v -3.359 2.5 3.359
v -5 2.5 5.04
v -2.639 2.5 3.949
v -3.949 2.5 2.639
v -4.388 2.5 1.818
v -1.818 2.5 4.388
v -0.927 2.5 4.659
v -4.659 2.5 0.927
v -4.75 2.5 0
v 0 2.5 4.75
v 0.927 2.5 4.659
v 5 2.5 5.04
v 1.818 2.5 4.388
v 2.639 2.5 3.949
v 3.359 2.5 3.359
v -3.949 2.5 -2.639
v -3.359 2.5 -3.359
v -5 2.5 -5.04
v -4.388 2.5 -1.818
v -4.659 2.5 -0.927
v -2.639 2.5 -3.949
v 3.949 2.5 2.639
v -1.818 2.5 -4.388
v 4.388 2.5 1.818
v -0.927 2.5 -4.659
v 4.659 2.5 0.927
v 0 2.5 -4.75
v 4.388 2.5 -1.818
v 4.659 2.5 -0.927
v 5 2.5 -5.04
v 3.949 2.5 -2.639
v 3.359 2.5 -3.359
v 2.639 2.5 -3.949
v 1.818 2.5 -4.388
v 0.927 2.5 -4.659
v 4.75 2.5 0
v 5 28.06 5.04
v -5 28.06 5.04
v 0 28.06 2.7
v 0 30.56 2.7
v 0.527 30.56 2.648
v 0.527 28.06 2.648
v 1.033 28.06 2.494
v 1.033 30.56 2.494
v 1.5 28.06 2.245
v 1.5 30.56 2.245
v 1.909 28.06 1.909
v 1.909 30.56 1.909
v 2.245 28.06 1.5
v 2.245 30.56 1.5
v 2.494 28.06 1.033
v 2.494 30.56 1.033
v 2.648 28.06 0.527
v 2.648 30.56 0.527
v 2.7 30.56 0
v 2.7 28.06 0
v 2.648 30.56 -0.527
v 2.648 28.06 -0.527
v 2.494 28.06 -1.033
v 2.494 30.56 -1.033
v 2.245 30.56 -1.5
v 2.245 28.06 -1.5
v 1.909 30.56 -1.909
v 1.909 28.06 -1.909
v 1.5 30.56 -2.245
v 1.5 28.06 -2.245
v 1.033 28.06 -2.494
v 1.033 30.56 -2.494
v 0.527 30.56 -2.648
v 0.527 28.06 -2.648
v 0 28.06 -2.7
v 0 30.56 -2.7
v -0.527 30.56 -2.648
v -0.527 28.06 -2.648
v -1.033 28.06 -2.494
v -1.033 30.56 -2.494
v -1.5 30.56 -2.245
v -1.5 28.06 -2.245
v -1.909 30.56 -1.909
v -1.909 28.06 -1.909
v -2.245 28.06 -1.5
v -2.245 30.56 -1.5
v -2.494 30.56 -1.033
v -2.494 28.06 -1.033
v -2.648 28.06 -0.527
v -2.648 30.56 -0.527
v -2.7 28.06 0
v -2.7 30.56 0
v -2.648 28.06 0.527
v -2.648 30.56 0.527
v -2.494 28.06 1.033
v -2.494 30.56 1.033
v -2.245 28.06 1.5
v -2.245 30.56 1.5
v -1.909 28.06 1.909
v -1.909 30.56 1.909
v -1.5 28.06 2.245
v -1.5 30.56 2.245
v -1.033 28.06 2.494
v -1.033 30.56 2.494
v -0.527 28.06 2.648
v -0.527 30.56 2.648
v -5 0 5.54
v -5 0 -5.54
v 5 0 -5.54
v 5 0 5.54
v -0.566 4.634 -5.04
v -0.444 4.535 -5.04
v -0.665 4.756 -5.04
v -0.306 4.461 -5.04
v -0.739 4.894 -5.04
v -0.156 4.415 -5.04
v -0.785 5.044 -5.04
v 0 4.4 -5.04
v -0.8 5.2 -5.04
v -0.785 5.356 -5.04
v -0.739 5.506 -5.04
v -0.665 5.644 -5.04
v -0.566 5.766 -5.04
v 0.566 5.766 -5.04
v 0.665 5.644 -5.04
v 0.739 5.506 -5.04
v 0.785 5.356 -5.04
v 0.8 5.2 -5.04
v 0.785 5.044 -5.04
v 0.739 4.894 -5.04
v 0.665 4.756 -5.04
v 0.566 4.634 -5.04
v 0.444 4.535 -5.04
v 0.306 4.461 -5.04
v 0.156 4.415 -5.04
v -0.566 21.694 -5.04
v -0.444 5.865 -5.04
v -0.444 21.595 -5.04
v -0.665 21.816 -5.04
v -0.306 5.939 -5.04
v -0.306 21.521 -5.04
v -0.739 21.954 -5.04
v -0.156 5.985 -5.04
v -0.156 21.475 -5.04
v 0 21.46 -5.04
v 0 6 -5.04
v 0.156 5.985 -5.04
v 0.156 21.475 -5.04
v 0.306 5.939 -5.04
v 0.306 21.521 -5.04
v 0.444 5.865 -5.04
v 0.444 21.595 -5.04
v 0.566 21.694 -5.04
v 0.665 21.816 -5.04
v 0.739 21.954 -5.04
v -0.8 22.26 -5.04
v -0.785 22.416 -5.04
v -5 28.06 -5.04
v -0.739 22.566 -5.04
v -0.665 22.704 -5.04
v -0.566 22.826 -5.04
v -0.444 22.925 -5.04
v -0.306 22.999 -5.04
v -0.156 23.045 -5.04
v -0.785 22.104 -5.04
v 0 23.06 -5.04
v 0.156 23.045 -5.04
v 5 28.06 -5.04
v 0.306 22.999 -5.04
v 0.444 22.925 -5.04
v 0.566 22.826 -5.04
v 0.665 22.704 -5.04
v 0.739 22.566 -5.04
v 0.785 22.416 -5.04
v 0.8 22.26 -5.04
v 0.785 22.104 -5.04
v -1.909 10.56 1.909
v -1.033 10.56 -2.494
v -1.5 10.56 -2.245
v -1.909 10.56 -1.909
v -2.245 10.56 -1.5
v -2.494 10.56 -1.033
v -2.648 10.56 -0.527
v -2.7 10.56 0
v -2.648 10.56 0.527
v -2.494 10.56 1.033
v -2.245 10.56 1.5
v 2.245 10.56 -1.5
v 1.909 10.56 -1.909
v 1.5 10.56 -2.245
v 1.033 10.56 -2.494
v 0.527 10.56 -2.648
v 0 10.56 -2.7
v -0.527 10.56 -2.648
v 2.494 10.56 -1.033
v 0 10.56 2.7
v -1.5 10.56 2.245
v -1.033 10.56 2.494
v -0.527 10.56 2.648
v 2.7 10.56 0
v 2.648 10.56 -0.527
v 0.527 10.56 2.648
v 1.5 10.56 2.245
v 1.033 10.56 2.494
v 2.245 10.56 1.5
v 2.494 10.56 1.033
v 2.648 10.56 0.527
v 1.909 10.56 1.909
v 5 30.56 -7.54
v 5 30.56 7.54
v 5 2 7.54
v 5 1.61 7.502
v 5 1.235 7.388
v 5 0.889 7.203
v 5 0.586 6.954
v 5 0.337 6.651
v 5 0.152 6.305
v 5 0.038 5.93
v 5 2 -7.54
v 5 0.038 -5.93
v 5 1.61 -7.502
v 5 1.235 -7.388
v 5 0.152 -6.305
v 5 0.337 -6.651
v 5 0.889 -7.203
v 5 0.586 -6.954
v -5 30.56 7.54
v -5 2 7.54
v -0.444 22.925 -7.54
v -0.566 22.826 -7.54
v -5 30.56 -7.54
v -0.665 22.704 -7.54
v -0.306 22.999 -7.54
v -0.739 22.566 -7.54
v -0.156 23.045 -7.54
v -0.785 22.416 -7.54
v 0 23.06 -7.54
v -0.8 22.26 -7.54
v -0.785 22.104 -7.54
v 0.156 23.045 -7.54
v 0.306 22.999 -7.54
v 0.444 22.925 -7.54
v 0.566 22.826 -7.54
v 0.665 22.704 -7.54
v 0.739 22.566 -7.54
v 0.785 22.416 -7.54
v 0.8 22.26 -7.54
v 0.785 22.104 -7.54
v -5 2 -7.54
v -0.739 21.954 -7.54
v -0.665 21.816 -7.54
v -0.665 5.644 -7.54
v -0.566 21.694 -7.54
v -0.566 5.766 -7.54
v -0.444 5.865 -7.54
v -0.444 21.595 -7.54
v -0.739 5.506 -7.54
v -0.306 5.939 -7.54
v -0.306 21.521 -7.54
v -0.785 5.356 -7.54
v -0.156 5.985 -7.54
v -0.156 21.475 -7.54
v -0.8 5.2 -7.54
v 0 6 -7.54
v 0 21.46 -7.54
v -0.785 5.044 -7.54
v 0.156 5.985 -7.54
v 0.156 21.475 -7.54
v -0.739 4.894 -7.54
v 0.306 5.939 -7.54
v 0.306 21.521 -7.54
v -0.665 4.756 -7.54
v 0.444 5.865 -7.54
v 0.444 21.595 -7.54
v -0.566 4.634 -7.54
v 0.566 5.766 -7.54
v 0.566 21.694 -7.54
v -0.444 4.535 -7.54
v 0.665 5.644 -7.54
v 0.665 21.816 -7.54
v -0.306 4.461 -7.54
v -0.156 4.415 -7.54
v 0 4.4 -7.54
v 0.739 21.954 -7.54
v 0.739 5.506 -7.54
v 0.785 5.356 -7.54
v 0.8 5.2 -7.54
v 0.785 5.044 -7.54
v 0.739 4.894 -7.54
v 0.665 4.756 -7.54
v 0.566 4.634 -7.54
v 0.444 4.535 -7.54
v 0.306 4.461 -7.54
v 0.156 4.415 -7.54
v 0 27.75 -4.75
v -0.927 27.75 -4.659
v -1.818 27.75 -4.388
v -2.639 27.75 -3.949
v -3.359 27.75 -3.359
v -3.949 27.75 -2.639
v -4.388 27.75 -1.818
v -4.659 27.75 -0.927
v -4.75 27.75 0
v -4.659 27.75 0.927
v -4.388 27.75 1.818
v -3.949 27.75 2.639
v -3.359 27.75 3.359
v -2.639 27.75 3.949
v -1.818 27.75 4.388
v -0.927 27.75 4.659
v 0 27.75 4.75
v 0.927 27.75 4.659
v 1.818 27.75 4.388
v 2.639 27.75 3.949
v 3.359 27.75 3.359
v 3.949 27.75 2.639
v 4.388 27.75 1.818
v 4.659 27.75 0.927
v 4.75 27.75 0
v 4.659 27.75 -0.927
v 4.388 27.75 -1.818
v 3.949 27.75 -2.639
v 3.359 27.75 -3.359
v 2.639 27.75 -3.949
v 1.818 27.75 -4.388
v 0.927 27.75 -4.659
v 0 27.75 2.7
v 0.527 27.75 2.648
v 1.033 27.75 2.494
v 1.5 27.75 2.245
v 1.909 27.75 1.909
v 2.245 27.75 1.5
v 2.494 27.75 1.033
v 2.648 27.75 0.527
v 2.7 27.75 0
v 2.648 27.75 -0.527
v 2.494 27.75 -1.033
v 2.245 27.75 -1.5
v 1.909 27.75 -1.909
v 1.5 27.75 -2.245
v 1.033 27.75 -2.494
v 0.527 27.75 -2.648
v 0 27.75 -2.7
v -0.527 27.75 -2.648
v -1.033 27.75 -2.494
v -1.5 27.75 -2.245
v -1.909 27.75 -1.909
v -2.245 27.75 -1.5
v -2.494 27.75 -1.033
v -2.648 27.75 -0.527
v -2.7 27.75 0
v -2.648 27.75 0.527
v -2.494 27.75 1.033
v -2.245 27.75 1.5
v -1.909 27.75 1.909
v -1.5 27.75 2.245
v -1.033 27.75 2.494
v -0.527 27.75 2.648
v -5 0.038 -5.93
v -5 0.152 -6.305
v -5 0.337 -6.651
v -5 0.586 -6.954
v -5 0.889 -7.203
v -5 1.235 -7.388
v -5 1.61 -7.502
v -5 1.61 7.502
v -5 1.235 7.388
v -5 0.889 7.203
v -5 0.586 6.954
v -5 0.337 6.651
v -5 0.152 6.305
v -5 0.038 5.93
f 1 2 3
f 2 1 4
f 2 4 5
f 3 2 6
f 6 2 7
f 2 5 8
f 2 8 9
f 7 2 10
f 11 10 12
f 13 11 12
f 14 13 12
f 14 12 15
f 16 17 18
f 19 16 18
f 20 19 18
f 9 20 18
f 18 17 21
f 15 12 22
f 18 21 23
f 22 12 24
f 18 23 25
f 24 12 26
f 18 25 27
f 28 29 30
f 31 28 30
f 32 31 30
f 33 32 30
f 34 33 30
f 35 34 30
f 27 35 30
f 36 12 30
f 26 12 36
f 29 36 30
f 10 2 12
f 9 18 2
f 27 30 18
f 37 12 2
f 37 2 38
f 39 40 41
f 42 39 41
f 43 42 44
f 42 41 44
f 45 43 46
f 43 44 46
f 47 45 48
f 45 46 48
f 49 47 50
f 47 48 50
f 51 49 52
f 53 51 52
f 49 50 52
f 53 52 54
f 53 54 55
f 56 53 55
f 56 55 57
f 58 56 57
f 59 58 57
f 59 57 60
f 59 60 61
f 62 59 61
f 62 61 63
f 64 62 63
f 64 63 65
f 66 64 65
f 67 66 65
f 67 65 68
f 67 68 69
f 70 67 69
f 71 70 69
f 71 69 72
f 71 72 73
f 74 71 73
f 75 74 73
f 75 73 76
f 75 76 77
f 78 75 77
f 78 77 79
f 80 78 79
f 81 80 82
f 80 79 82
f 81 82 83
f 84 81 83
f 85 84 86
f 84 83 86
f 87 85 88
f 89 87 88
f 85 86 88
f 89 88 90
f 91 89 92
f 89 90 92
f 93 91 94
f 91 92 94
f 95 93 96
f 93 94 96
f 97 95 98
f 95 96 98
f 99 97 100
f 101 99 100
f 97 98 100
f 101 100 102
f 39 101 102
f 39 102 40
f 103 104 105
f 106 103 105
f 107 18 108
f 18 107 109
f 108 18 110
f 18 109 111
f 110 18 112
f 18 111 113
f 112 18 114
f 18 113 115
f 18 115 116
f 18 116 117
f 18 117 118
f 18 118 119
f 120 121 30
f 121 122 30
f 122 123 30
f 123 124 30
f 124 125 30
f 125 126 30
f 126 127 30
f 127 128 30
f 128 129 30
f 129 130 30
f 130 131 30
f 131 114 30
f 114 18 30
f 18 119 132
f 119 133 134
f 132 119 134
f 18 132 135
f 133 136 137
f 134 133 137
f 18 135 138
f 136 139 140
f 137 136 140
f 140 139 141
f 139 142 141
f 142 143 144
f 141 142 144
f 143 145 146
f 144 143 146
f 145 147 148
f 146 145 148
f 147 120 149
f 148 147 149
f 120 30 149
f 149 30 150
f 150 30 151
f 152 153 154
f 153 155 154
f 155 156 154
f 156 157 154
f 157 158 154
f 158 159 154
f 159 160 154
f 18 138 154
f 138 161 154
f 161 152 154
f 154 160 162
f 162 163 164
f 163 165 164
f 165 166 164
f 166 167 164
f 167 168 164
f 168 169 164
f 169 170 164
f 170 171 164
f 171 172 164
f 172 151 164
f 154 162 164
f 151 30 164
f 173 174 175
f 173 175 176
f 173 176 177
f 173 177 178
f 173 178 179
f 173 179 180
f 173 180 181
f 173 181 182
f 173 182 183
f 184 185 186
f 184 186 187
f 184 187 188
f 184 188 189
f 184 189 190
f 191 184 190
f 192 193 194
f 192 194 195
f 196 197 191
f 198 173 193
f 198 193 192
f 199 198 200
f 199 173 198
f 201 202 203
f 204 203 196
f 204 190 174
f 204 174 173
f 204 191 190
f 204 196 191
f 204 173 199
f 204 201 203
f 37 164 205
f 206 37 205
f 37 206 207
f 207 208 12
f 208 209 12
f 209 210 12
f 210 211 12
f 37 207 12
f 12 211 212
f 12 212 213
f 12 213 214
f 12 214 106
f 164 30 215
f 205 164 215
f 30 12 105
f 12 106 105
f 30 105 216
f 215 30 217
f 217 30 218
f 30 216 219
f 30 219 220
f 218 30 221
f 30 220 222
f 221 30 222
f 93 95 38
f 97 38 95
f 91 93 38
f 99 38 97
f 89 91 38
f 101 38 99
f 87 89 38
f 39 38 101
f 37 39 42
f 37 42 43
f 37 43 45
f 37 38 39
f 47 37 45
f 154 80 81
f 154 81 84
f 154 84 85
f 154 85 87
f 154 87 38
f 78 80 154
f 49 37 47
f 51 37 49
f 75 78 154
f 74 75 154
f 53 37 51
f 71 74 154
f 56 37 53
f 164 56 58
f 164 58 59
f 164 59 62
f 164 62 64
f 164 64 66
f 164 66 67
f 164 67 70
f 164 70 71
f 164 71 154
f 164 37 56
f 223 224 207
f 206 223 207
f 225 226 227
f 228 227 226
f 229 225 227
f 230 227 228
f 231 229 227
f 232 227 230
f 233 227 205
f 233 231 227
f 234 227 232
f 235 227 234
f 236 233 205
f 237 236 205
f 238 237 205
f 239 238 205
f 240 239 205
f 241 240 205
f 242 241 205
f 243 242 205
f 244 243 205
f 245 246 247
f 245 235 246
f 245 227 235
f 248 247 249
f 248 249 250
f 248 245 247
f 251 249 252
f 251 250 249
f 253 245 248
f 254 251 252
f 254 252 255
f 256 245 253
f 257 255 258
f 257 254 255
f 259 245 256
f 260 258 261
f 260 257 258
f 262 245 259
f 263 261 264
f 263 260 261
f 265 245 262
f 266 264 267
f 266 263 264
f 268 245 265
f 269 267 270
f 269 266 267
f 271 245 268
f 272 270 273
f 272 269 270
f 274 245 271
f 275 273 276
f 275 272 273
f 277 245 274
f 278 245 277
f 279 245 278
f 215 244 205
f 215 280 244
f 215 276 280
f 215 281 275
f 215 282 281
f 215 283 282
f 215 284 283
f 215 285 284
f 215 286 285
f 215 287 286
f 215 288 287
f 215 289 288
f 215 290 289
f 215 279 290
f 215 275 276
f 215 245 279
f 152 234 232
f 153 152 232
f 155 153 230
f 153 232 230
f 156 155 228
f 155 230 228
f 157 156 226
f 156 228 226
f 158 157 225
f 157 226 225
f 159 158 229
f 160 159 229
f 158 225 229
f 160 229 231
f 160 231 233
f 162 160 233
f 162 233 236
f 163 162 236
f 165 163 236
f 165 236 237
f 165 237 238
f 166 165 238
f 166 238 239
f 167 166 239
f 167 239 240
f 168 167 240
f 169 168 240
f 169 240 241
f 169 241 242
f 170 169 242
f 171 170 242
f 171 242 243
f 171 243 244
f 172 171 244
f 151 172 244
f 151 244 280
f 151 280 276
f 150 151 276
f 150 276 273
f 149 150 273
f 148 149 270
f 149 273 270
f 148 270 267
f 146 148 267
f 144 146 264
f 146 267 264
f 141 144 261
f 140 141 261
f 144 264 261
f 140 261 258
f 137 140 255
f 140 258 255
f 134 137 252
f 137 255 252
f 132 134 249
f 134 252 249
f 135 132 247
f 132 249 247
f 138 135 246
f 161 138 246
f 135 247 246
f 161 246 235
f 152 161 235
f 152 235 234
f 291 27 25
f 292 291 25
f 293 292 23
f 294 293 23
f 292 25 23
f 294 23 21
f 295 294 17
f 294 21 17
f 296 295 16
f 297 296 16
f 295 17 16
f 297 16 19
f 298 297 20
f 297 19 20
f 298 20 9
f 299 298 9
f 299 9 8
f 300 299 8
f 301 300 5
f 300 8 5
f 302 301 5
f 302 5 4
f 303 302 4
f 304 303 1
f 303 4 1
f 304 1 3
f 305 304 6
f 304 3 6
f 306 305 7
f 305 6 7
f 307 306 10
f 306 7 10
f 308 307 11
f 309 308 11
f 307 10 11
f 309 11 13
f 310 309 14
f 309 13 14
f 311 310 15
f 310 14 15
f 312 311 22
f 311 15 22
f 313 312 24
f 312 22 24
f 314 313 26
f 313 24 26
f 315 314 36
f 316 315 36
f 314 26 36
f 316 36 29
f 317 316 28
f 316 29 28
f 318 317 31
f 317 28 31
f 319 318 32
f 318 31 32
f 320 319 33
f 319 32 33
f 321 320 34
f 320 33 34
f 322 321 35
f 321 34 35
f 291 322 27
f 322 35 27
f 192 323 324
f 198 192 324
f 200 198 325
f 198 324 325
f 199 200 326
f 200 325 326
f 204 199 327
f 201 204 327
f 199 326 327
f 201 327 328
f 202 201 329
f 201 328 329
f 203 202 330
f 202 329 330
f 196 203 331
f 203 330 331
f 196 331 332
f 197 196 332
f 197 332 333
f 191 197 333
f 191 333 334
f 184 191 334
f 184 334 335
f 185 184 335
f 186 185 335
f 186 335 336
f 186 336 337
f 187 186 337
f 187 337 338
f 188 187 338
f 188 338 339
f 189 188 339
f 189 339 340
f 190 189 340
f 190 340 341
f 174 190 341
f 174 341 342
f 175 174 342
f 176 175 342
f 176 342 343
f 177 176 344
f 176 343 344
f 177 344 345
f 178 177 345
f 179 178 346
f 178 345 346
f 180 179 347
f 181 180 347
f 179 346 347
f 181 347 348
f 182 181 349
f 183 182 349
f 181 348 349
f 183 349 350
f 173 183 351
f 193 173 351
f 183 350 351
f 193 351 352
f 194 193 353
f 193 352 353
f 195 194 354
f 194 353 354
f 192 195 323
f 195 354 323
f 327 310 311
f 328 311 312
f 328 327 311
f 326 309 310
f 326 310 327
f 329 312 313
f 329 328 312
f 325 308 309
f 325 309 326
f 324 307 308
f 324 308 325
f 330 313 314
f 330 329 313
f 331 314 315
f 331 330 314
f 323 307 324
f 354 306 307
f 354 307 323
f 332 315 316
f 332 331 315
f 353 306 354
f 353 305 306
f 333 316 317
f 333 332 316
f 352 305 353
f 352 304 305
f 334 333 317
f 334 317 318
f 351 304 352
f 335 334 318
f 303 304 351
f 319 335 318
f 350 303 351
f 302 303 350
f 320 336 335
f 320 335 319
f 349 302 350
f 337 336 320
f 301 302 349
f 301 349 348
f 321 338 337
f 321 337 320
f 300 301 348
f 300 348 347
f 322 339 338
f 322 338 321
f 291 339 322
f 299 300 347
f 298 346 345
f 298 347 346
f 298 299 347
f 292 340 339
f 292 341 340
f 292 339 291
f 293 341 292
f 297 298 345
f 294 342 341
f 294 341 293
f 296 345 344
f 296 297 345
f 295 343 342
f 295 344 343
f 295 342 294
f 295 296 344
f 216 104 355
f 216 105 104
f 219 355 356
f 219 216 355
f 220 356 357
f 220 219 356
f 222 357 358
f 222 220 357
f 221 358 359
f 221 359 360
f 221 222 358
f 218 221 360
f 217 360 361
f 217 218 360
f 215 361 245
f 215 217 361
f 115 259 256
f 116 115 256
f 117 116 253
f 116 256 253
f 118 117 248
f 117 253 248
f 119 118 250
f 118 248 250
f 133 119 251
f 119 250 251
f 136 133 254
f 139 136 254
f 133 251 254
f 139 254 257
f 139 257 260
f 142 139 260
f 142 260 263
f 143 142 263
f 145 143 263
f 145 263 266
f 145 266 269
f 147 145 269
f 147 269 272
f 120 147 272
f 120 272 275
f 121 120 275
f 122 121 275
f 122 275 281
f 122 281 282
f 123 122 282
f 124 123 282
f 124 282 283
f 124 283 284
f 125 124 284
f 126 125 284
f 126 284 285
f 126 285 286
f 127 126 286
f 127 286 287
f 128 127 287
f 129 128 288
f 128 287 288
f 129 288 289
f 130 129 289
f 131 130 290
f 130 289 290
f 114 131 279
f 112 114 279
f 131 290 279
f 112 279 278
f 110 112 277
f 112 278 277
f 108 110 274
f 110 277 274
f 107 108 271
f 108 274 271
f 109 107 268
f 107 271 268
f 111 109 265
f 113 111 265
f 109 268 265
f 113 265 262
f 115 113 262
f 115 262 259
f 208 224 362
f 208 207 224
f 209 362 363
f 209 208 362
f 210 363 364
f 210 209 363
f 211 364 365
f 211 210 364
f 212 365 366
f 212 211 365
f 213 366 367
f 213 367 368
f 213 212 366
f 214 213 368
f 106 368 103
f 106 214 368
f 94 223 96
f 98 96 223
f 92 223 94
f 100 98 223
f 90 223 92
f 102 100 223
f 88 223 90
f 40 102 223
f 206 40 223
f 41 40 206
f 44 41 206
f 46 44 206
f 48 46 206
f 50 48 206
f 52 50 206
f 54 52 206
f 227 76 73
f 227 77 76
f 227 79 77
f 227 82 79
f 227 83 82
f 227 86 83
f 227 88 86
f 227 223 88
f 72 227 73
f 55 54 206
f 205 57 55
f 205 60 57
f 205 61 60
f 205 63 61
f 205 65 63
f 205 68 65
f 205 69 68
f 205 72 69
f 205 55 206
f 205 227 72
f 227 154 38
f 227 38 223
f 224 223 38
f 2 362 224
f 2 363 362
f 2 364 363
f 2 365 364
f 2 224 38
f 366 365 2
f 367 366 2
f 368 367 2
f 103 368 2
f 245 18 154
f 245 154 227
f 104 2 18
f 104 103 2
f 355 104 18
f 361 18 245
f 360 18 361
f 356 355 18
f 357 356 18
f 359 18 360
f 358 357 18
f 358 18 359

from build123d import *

# Parameters (mm, degrees)
SKETCH1_W           = 10
SKETCH1_H           = 15.08
BOSS_EXTRUDE1_DEPTH = 30.56
SKETCH2_W           = 10.08
SKETCH2_H           = 25.56
CUT_EXTRUDE1_DEPTH  = 20
SKETCH5_R           = 4.75
BOSS_EXTRUDE2_DEPTH = 25.25
SKETCH3_R           = 2.7
CUT_EXTRUDE2_DEPTH  = 20
FILLET1_R           = 2
CUT_EXTRUDE3_REACH  = 36.443
SKETCH4_R           = 0.8


with BuildPart() as part:
    # Sketch1 → Boss-Extrude1 (new body)
    with BuildSketch(Plane(origin=(0, 0, 0), x_dir=(1, 0, 0), z_dir=(0, 1, 0))):
        Rectangle(SKETCH1_W, SKETCH1_H)
    extrude(amount=BOSS_EXTRUDE1_DEPTH)

    # Sketch2 → Cut-Extrude1 (cut)
    with BuildSketch(Plane(origin=(5, 0, 0), x_dir=(0, 0, -1), z_dir=(1, 0, 0))):
        with Locations((0, 15.28)):
            Rectangle(SKETCH2_W, SKETCH2_H)
    extrude(amount=-CUT_EXTRUDE1_DEPTH, mode=Mode.SUBTRACT)

    # Sketch5 → Boss-Extrude2 (add)
    with BuildSketch(Plane(origin=(0, 2.5, 0), x_dir=(1, 0, 0), z_dir=(0, 1, 0))):
        with Locations(Location((0, 0, 0), (0, 0, 90))):
            Circle(SKETCH5_R)
    extrude(amount=BOSS_EXTRUDE2_DEPTH)

    # Sketch3 → Cut-Extrude2 (cut)
    with BuildSketch(Plane(origin=(0, 30.56, 0), x_dir=(1, 0, 0), z_dir=(0, 1, 0))):
        with Locations(Location((0, 0, 0), (0, 0, 270))):
            Circle(SKETCH3_R)
    extrude(amount=-CUT_EXTRUDE2_DEPTH, mode=Mode.SUBTRACT)

    # Fillet1
    fillet1_edges = [part.edges().sort_by_distance(p)[0] for p in [
        (0, 0, 7.54),
        (0, 0, -7.54),
    ]]
    fillet(fillet1_edges, radius=FILLET1_R)

    # Sketch4 → Cut-Extrude3 (cut, up to next)
    with BuildSketch(Plane(origin=(0, 0, -7.54), x_dir=(-1, 0, 0), z_dir=(0, 0, -1)), mode=Mode.PRIVATE) as cut_extrude3_sk1:
        with Locations((0, 22.26)):
            Circle(SKETCH4_R)
    cut_extrude3_tool1 = extrude(cut_extrude3_sk1.sketch, amount=-CUT_EXTRUDE3_REACH, mode=Mode.PRIVATE) & part.part
    # Sketch4 → Cut-Extrude3 (cut, up to next)
    with BuildSketch(Plane(origin=(0, 0, -7.54), x_dir=(-1, 0, 0), z_dir=(0, 0, -1)), mode=Mode.PRIVATE) as cut_extrude3_sk2:
        with Locations((0, 5.2)):
            Circle(SKETCH4_R)
    cut_extrude3_tool2 = extrude(cut_extrude3_sk2.sketch, amount=-CUT_EXTRUDE3_REACH, mode=Mode.PRIVATE) & part.part
    add(cut_extrude3_tool1.solids().sort_by_distance((0, 22.26, -7.54))[0], mode=Mode.SUBTRACT)
    add(cut_extrude3_tool2.solids().sort_by_distance((0, 5.2, -7.54))[0], mode=Mode.SUBTRACT)


solid = part.part
